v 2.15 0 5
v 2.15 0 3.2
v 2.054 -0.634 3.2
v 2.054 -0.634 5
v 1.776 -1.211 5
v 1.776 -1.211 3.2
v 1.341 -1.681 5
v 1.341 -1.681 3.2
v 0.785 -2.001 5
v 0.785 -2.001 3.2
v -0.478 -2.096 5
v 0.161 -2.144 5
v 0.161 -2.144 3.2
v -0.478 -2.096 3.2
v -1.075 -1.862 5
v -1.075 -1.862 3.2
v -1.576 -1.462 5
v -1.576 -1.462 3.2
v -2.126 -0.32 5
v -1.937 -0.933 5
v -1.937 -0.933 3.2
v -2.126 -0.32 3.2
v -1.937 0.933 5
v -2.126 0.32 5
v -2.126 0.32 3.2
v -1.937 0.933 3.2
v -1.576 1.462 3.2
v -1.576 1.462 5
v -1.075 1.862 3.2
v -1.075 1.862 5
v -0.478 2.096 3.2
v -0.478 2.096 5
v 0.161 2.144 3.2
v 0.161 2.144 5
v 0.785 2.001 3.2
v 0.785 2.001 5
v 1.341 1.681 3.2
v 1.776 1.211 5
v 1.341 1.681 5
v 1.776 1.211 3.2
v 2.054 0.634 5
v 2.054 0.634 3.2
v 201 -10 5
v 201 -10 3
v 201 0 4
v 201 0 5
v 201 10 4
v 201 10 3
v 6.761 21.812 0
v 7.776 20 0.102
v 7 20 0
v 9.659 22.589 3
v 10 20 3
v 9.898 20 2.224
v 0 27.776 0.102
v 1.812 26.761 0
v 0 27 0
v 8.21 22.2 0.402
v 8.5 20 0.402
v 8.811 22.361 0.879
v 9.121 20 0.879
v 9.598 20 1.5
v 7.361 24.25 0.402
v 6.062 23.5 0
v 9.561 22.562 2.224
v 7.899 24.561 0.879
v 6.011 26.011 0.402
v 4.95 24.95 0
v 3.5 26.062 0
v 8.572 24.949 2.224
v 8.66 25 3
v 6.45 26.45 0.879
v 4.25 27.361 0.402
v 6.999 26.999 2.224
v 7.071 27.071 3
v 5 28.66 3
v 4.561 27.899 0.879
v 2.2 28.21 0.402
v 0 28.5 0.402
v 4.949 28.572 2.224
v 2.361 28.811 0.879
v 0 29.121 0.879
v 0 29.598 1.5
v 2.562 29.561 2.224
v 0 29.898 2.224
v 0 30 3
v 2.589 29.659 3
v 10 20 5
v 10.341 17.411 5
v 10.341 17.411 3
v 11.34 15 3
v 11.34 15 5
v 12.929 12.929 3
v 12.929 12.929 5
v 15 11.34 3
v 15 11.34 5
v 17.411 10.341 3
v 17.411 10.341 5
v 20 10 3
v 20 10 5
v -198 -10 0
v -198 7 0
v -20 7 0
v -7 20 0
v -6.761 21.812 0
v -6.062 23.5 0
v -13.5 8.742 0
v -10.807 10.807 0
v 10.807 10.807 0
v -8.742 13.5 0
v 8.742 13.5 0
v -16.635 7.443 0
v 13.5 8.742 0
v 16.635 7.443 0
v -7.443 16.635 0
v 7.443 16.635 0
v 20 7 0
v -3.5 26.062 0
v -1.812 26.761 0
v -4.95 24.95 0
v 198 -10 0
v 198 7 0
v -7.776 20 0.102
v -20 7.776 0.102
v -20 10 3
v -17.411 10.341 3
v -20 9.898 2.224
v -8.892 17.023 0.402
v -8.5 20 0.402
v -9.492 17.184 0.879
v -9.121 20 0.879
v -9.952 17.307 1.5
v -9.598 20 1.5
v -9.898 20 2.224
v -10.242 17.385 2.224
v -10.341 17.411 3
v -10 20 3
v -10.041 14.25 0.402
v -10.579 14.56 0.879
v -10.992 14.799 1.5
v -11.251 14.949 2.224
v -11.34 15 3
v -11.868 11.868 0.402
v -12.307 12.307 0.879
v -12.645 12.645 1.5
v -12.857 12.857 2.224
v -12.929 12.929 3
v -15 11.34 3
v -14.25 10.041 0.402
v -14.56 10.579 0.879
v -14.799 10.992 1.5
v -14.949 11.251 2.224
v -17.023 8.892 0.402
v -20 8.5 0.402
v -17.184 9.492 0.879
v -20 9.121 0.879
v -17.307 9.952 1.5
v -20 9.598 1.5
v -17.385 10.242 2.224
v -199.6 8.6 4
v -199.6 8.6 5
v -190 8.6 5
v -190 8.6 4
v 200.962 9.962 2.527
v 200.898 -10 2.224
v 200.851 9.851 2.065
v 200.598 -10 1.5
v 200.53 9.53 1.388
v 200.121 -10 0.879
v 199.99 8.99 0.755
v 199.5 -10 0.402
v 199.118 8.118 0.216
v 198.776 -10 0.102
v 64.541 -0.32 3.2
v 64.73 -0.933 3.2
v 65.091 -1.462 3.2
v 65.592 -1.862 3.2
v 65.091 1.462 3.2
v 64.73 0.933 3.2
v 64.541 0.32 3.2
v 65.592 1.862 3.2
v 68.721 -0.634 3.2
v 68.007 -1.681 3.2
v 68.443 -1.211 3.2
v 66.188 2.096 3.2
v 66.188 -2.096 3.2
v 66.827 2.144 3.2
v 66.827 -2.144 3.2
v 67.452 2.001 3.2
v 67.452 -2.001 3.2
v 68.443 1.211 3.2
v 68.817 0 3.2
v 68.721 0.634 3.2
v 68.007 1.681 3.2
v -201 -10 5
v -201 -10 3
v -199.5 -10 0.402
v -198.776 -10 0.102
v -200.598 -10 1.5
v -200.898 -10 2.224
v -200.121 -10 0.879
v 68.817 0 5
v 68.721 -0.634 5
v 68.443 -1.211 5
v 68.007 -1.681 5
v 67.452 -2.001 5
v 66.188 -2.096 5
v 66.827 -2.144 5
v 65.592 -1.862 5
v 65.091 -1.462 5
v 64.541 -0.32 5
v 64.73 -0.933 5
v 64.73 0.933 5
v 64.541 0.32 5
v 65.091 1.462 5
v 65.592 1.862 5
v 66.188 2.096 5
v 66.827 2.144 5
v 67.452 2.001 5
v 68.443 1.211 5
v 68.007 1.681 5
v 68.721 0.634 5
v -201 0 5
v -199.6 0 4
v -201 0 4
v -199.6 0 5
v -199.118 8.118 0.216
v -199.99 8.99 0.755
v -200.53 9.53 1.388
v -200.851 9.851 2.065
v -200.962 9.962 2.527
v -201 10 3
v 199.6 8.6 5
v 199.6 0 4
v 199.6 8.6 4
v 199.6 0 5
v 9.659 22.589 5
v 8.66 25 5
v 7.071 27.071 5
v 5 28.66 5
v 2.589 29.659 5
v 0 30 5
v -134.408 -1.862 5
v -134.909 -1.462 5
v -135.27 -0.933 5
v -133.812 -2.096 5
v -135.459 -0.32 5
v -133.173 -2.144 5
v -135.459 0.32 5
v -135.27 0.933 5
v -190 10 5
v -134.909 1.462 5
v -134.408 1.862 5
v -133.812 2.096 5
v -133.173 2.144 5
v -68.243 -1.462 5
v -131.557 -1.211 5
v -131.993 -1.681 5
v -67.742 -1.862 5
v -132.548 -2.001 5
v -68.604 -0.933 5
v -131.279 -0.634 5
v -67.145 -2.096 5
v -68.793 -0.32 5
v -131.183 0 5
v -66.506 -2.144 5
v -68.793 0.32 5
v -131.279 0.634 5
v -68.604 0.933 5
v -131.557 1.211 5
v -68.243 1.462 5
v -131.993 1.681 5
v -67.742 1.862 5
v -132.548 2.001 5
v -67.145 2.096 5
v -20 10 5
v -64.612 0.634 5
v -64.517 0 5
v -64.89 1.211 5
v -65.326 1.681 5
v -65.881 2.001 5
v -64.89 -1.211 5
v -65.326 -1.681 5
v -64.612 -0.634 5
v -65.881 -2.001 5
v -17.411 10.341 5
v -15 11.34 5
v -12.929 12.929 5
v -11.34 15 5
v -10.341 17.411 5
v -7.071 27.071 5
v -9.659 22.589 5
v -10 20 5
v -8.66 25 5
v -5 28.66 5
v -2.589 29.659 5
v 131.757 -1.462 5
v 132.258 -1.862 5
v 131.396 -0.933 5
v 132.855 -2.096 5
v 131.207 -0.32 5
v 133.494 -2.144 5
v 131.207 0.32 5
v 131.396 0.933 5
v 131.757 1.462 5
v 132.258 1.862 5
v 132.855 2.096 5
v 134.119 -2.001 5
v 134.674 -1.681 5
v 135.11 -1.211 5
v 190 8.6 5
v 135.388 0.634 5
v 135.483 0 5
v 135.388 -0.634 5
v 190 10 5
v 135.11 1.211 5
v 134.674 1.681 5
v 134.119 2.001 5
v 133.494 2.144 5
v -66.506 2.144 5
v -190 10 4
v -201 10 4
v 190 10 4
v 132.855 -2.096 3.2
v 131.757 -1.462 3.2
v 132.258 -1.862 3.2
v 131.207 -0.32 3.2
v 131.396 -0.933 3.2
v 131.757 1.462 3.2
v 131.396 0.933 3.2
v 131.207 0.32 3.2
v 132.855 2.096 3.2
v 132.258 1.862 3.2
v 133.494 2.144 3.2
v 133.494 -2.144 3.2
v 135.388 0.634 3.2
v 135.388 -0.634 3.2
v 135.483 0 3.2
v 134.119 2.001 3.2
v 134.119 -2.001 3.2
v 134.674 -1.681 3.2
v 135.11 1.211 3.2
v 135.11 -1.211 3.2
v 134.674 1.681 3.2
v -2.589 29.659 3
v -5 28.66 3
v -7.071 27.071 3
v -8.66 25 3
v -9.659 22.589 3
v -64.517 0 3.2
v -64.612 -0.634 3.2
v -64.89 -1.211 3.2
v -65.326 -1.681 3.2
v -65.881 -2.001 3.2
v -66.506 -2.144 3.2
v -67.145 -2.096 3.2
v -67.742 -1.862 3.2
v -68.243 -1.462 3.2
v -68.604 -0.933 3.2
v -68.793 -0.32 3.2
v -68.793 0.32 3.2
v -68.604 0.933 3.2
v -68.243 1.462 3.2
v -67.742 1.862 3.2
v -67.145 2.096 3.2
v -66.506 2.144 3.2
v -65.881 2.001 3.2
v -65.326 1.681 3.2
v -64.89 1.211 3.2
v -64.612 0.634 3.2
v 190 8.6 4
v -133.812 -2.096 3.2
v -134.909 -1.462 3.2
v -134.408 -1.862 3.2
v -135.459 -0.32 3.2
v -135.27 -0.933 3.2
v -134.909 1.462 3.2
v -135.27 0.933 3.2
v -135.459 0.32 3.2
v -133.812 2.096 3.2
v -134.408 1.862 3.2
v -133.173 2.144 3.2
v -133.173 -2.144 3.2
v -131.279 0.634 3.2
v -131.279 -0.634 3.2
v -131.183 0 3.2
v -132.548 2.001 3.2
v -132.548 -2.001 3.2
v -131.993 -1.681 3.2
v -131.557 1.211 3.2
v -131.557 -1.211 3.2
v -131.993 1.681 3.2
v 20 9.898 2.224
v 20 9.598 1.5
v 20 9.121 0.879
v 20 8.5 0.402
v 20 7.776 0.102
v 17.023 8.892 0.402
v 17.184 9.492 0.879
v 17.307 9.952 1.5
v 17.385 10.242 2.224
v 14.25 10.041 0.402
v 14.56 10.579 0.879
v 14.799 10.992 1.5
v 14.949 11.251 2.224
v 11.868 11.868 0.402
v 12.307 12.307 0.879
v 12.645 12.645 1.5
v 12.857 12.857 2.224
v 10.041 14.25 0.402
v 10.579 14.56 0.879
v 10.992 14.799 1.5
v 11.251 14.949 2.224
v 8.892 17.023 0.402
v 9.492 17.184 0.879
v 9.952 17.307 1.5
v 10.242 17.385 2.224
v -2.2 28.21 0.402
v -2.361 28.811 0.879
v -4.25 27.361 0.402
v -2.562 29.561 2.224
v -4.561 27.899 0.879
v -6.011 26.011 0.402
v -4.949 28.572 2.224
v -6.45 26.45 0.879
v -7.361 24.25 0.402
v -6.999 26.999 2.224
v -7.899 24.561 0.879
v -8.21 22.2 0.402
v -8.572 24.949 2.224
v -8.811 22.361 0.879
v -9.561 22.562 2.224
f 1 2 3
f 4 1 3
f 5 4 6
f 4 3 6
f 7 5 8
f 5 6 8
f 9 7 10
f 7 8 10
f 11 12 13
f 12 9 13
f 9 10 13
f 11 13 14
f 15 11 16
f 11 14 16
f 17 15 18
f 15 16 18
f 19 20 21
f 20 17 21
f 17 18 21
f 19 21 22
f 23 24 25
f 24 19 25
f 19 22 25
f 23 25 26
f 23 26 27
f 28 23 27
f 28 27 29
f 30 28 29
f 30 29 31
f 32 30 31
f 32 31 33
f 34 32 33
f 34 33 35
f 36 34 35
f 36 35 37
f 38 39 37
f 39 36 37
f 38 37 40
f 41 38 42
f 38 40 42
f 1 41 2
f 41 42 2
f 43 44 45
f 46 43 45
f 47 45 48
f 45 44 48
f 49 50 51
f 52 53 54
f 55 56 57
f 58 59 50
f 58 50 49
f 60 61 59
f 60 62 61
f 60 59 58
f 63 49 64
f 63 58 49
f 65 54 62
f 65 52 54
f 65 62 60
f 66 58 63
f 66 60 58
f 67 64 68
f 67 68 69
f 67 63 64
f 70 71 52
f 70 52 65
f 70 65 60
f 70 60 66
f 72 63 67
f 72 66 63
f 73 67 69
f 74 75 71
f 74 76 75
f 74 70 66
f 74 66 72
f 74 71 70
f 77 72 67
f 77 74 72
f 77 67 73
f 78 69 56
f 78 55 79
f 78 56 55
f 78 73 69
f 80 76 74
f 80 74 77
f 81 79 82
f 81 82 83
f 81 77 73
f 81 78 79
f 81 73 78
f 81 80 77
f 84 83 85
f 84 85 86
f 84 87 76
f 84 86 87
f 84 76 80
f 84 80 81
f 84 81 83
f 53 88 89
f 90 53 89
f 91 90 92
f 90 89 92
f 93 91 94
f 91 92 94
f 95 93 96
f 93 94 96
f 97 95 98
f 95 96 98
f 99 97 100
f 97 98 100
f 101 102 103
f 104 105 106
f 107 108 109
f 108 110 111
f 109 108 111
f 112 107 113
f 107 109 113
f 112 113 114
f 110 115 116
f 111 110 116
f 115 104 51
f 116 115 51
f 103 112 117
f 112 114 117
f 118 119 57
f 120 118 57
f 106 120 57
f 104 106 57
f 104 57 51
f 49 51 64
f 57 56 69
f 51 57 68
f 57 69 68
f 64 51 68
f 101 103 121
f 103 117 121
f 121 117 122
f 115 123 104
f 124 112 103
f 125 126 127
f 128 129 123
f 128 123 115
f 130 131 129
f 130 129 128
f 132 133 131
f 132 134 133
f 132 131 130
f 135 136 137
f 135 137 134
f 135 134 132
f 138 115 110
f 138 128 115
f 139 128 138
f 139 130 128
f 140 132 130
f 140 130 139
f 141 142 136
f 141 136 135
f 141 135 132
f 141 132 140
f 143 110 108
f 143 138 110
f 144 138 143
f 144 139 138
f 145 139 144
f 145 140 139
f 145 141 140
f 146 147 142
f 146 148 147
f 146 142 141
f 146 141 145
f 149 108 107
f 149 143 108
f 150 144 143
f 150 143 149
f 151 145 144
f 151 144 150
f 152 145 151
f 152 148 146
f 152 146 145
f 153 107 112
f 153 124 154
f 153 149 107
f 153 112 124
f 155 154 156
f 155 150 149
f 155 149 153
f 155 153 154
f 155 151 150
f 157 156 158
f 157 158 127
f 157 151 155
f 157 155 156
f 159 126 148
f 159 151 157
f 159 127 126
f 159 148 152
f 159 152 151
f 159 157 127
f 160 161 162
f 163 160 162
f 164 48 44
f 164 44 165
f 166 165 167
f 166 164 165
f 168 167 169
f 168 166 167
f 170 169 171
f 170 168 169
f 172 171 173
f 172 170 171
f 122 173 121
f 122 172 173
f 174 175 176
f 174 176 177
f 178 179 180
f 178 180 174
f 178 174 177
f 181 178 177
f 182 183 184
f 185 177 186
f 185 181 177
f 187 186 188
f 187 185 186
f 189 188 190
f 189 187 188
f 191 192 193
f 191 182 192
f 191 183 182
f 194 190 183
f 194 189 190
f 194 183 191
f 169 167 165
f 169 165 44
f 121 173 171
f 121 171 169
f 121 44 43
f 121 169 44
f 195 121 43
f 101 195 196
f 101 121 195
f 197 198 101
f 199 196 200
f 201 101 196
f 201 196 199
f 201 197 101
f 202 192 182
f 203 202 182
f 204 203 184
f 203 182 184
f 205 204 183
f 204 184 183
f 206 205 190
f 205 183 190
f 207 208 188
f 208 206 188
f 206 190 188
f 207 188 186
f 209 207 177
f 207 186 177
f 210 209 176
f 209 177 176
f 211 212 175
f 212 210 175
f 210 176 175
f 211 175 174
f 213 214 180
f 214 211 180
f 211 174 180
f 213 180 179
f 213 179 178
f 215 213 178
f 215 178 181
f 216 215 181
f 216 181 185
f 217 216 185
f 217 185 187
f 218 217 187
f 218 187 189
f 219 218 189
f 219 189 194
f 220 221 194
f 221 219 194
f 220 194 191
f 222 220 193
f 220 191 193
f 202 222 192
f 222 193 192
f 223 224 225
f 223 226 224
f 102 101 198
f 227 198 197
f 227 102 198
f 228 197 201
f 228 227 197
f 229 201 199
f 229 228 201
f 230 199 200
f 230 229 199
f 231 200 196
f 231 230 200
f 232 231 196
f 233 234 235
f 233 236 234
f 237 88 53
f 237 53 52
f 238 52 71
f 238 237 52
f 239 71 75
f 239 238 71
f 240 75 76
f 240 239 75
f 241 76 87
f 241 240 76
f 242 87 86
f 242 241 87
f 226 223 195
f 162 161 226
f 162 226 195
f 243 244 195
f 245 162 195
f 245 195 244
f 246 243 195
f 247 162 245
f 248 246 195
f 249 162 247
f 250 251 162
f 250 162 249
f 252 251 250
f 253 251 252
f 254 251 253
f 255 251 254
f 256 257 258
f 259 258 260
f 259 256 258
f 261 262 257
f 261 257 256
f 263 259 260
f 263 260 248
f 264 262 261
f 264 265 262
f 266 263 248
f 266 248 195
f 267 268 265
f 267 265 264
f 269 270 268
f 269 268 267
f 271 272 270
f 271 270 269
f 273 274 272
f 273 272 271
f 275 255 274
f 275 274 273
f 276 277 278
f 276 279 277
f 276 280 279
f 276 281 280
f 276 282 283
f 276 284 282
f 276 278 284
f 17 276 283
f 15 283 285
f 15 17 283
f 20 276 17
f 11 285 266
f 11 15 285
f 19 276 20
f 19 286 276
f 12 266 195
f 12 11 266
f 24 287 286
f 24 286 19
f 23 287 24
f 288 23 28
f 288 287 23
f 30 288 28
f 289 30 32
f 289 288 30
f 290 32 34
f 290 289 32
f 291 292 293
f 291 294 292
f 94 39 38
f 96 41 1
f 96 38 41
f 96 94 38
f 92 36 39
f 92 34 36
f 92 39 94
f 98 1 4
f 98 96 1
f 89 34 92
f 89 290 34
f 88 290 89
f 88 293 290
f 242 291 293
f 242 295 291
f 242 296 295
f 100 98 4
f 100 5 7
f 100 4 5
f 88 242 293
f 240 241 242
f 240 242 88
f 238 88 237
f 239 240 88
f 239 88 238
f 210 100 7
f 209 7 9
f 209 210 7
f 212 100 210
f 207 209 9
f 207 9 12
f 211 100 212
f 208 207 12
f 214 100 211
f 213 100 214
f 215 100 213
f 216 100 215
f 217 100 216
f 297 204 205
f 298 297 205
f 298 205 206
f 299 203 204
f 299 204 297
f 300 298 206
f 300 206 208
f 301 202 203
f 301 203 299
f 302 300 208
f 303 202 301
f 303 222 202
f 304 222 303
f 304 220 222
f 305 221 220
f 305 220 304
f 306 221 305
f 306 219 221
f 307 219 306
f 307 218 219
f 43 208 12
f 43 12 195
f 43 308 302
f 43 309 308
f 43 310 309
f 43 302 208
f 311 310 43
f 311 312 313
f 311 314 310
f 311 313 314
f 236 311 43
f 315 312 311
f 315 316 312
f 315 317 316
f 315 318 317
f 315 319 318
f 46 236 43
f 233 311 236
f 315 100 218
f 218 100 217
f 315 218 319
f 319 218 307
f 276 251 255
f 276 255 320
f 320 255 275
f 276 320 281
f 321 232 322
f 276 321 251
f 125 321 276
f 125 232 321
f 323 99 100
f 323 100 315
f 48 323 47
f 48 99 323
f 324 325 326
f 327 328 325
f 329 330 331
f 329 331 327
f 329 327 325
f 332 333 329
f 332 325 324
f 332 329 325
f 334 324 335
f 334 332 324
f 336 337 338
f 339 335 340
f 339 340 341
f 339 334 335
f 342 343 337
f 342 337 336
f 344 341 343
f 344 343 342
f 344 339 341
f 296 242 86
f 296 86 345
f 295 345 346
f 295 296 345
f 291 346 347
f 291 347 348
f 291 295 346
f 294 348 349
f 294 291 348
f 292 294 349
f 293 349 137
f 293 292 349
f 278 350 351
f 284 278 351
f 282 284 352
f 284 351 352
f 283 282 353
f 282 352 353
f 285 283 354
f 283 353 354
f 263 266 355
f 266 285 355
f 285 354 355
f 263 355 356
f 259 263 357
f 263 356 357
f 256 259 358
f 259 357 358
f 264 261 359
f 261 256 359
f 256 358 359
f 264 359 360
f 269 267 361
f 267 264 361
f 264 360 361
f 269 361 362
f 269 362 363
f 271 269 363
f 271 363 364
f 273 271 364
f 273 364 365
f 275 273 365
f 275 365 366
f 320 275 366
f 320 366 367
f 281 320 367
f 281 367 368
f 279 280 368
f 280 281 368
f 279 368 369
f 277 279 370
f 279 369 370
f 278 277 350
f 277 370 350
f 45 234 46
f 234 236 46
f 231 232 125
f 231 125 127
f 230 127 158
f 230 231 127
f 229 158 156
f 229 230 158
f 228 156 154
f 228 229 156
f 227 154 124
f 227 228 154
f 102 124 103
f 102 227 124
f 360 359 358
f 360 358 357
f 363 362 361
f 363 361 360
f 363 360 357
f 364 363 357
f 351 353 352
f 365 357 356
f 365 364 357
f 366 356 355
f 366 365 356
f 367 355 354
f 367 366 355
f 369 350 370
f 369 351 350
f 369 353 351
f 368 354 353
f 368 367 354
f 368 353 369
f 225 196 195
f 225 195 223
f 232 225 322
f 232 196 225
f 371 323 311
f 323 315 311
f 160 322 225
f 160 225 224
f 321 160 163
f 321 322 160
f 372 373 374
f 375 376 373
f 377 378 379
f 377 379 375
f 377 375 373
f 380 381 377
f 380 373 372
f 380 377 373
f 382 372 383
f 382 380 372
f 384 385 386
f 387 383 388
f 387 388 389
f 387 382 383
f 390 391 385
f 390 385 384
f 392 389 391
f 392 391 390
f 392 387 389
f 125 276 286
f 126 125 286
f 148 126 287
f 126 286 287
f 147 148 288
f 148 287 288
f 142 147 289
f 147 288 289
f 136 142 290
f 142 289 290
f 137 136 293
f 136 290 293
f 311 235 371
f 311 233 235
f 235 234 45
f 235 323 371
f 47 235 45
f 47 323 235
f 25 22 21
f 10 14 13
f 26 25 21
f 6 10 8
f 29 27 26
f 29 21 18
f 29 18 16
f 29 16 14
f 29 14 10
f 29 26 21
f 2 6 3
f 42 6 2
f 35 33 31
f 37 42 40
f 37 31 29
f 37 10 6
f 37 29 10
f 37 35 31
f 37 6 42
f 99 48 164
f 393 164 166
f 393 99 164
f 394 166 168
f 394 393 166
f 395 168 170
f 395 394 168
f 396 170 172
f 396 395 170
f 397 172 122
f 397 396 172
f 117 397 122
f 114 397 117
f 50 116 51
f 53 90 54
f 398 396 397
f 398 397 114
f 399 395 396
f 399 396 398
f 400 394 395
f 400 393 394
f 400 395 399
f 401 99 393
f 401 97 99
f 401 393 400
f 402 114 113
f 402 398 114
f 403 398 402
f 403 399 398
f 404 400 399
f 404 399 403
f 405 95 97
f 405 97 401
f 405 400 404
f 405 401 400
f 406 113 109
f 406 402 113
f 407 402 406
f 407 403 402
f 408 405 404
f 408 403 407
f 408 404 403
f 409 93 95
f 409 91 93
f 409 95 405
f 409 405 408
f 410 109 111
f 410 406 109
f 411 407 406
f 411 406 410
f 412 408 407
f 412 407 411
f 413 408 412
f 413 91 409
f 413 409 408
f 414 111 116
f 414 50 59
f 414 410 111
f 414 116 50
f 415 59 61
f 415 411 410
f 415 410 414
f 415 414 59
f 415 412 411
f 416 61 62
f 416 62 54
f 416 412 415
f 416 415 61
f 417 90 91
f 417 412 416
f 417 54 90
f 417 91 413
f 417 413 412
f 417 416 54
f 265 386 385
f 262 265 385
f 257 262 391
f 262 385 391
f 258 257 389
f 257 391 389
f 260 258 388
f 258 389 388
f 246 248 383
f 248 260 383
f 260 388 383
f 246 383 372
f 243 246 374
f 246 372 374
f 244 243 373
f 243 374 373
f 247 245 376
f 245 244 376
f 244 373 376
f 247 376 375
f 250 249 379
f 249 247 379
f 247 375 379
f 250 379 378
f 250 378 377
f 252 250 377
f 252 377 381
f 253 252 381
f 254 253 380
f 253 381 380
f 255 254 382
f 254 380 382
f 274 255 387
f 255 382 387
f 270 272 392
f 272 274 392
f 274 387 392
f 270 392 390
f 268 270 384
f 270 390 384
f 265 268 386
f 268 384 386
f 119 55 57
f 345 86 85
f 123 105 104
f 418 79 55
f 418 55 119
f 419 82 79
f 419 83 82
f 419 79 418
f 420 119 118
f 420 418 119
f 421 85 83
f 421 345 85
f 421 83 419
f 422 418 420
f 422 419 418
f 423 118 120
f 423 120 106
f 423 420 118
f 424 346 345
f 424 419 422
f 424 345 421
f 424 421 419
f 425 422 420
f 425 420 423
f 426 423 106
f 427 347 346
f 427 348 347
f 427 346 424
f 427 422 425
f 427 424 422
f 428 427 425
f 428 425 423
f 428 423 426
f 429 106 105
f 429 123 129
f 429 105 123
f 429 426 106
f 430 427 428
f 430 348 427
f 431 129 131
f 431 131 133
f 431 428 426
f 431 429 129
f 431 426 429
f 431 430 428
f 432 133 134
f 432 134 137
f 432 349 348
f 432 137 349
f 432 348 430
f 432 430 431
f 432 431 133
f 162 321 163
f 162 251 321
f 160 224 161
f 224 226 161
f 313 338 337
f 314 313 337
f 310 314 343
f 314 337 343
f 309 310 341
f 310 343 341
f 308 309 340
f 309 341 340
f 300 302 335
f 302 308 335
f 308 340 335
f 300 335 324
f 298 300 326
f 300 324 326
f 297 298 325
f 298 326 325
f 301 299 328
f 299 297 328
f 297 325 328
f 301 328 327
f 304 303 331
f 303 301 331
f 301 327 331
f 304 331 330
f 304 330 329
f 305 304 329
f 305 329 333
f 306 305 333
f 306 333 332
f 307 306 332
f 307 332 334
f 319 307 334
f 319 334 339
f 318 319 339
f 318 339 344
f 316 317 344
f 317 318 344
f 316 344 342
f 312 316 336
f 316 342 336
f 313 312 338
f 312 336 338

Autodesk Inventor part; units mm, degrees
ref_plane "YZ Plane" through (0, 0, 0) normal (1, 0, 0) x (0, 1, 0)
ref_plane "XZ Plane" through (0, 0, 0) normal (0, 1, 0) x (-1, 0, 0)
ref_plane "XY Plane" through (0, 0, 0) normal (0, 0, 1) x (1, 0, 0)
sketch "Sketch1" plane through (0, 0, 0) normal (0, 0, 1) x (1, 0, 0)
  line L0 (-200, 10) -> (200, 10)
  line L1 (200, 10) -> (200, -10)
  line L2 (200, -10) -> (-200, -10)
  line L3 (-200, -10) -> (-200, 10)
  circle A0 centre (-133.3333, 0) radius 2.15
  circle A1 centre (-66.6667, 0) radius 2.15
  circle A2 centre (0, 0) radius 2.15
  circle A3 centre (66.6667, 0) radius 2.15
  circle A4 centre (133.3333, 0) radius 2.15
  line L4 (-10, 10) -> (10, 10)
  line L5 (10, 10) -> (10, 30)
  line L6 (10, 30) -> (-10, 30)
  line L7 (-10, 30) -> (-10, 10)
  line L8 (-200, -10) -> (-201, -10)
  line L9 (-201, -10) -> (-201, 10)
  line L10 (-201, 10) -> (-200, 10)
  line L11 (-200, 10) -> (-200, -10)
  line L12 (200, -10) -> (201, -10)
  line L13 (201, -10) -> (201, 10)
  line L14 (201, 10) -> (200, 10)
  line L15 (200, 10) -> (200, -10)
  point P0 (0, 0)
  point P1 (0, 10)
  point P2 (200, 0)
  point P3 (-200, 0)
  point P4 (0, 30)
  dimension "d0" = 400
  dimension "d1" = 20
  dimension "d2" = 4.3
  dimension "d3" = 66.6667
  dimension "d6" = 66.6667
  dimension "d21" = 20
  dimension "d22" = 20
  dimension "d45" = 1
  dimension "d46" = 1
extrude "Extrusion1" add sketch "Sketch1" along normal blind 5
fillet "Fillet1" radius 10 4 edges at (10, 10, 2.5) (10, 30, 2.5) (-10, 10, 2.5) (-10, 30, 2.5)
extrude "Extrusion2" add sketch "Sketch1" along normal blind 3.2 contours A0 | A1 | A2 | A3 | A4
sketch "Sketch3" plane through (-190, 10, 0) normal (0, 1, 0) x (1, 0, 0)
  line L0 (190, 0) -> (190, -5)
  line L1 (390, -5) -> (210, -5) projected
  circle A0 centre (190, -2.5) radius 2
  line L2 (190.5, -4.5) -> (189.5, -4.5)
  line L3 (189.5, -4.5) -> (189.5, -0.5)
  line L4 (189.5, -0.5) -> (190.5, -0.5)
  line L5 (190.5, -0.5) -> (190.5, -4.5)
  point P0 (380, -5)
  point P1 (0, -5)
  point P2 (190, -4.5)
  point P3 (189.5, -2.5)
  point P4 (190.5, -0.5635)
  point P5 (190.5, -4.4365)
  dimension "d18" = 4
  dimension "d19" = 1
revolve "Revolution2" [suppressed]
sketch "Sketch4" plane through (0, 0, 0) normal (0, 0, -1) x (-1, 0, 0)
  arc A0 (10, 20) -> (-10, 20) centre (0, 20) ccw projected
  circle A1 centre (0, 20) radius 6
  line L0 (-6, 20) -> (6, 20)
  line L1 (6, 20) -> (6, 5)
  line L2 (6, 5) -> (-6, 5)
  line L3 (-6, 5) -> (-6, 13.2336)
  line L4 (-6, 20) -> (-4, 20)
  line L5 (-4, 20) -> (-4, 17.7057)
  line L6 (-6, 16.9596) -> (-6, 20)
  line L7 (0, 5) -> (0, 6)
  circle A2 centre (0, 11) radius 6
  arc A3 (-5, 15.4697) -> (-4, 17.7057) centre (-7, 17.7057) ccw
  arc A4 (-5, 15.4697) -> (-6, 13.2336) centre (-3, 13.2336) ccw
  line L8 (-6, 13.2336) -> (-6, 16.9596)
  line L9 (4, 20) -> (4, 17.7057)
  arc A5 (4, 17.7057) -> (5, 15.4697) centre (7, 17.7057) ccw
  arc A6 (6, 13.2336) -> (5, 15.4697) centre (3, 13.2336) ccw
  circle A7 centre (0, 20) radius 4
  point P0 (0, 0)
  point P1 (-4, 15)
  point P2 (6, 13.2336)
  point P3 (-6, 18.4798)
  point P4 (4.5061, 16.0383)
  point P5 (-4.5061, 16.0383)
  dimension "d36" = 8
  dimension "d38" = 2
  dimension "d25" = 15
  dimension "d27" = 2.8
  dimension "d28" = 5
  dimension "d30" = 3
  dimension "d39" = 12
extrude "Extrusion3" [suppressed]
extrude "Extrusion4" add sketch "Sketch4" against normal blind 1 contours L0 A7 A1 | L1 A6 A5 A1 | A1 A5 L9 L0 | L0 L5 A3 A1 | A1 A3 A4 L8 L6
ref_plane "Work Plane1" through (-4, 17.7057, 0) normal (0, -1, 0) x (1, 0, 0)
sketch "Sketch5" plane through (-4, 17.7057, 0) normal (0, -1, 0) x (1, 0, 0)
  line L0 (8, 1) -> (10, 3)
  line L1 (8, 1) -> (10.8284, 1) construction
  line L2 (10, 3) -> (10, 1)
  line L3 (10, 1) -> (8, 1)
  point P0 (4, 0)
  dimension "d40" = 45
sketch "Sketch6" plane through (0, 0, 0) normal (0, 0, -1) x (-1, 0, 0)
  line L0 (-4, 17.7057) -> (-4, 20) projected
  arc A0 (4, 20) -> (-4, 20) centre (0, 20) ccw projected
  line L1 (4, 20) -> (4, 17.7057) projected
  point P0 (0, 0)
sweep "Sweep1" [suppressed]
fillet "Fillet2" [suppressed]
fillet "Fillet3" radius 3 5 edges at (-10, 20, 0) (10, 20, 0) (7.0712, 27.0712, 0) (201, 0, 0) (-201, 0, 0)
sketch "Sketch7" plane through (0, 0, 5) normal (0, 0, 1) x (1, 0, 0)
  line L0 (-20, 10) -> (-201, 10) projected
  line L1 (-201, 10) -> (-200, 10)
  line L2 (-200, 10) -> (-200, 0)
  line L3 (-200, 0) -> (-201, 0)
  line L4 (-201, 0) -> (-201, 10)
  line L5 (-200, 10) -> (-190, 10)
  line L6 (-190, 10) -> (-190, 9)
  line L7 (-190, 9) -> (-200, 9)
  line L8 (-200, 9) -> (-200, 10)
  line L9 (0, 0) -> (0, 1.5374)
  line L10 (20, 10) -> (201, 10)
  line L11 (201, 10) -> (200, 10)
  line L12 (200, 10) -> (200, 0)
  line L13 (200, 0) -> (201, 0)
  line L14 (201, 0) -> (201, 10)
  line L15 (200, 10) -> (190, 10)
  line L16 (190, 10) -> (190, 9)
  line L17 (190, 9) -> (200, 9)
  line L18 (200, 9) -> (200, 10)
  line L19 (-200, 0) -> (-199.6, 0)
  line L20 (-199.6, 0) -> (-199.6, 9)
  line L21 (-199.6, 9) -> (-200, 9)
  line L22 (-200, 9) -> (-200, 0)
  line L23 (-190, 9) -> (-200, 9)
  line L24 (-200, 9) -> (-200, 8.6)
  line L25 (-200, 8.6) -> (-190, 8.6)
  line L26 (-190, 8.6) -> (-190, 9)
  line L27 (190, 9) -> (200, 9)
  line L28 (200, 9) -> (200, 8.6)
  line L29 (200, 8.6) -> (190, 8.6)
  line L30 (190, 8.6) -> (190, 9)
  line L31 (200, 0) -> (199.6, 0)
  line L32 (199.6, 0) -> (199.6, 8.6)
  line L33 (199.6, 8.6) -> (200, 8.6)
  line L34 (200, 8.6) -> (200, 0)
  point P0 (-199.6, 8.6)
  dimension "d47" = 1
  dimension "d48" = 10
  dimension "d49" = 10
  dimension "d50" = 1
  dimension "d53" = 0.4
  dimension "d54" = 0.4
  dimension "d55" = 0.4
  dimension "d56" = 0.4
extrude "Extrusion5" cut sketch "Sketch7" against normal blind 1
equation "\"d0\" = dolzina_drzala"
equation "\"d1\" = sirina_drzala"
equation "\"d2\" = fi_magneta + 2 * toleranca"
equation "\"d6\" = d3"
equation "\"d11\" = debelina_drzala"
equation "\"d14\" = -globina_luknje + debelina_drzala - toleranca"
equation "\"d27\" = -0.5 * d23 + 0.5 * d24"
equation "\"d39\" = d36 + 2 * d38"
equation "\"fi_magneta\" = 3.7"
equation "\"toleranca\" = 0.3"
equation "\"dolzina_drzala\" = 400"
equation "\"sirina_drzala\" = 20"
equation "\"debelina_drzala\" = 5"
equation "\"globina_luknje\" = 1.5"
equation "\"d23\" = 4.4"
equation "\"d24\" = 10"
properties part number "drzalo_za_poster_40x60_top"
